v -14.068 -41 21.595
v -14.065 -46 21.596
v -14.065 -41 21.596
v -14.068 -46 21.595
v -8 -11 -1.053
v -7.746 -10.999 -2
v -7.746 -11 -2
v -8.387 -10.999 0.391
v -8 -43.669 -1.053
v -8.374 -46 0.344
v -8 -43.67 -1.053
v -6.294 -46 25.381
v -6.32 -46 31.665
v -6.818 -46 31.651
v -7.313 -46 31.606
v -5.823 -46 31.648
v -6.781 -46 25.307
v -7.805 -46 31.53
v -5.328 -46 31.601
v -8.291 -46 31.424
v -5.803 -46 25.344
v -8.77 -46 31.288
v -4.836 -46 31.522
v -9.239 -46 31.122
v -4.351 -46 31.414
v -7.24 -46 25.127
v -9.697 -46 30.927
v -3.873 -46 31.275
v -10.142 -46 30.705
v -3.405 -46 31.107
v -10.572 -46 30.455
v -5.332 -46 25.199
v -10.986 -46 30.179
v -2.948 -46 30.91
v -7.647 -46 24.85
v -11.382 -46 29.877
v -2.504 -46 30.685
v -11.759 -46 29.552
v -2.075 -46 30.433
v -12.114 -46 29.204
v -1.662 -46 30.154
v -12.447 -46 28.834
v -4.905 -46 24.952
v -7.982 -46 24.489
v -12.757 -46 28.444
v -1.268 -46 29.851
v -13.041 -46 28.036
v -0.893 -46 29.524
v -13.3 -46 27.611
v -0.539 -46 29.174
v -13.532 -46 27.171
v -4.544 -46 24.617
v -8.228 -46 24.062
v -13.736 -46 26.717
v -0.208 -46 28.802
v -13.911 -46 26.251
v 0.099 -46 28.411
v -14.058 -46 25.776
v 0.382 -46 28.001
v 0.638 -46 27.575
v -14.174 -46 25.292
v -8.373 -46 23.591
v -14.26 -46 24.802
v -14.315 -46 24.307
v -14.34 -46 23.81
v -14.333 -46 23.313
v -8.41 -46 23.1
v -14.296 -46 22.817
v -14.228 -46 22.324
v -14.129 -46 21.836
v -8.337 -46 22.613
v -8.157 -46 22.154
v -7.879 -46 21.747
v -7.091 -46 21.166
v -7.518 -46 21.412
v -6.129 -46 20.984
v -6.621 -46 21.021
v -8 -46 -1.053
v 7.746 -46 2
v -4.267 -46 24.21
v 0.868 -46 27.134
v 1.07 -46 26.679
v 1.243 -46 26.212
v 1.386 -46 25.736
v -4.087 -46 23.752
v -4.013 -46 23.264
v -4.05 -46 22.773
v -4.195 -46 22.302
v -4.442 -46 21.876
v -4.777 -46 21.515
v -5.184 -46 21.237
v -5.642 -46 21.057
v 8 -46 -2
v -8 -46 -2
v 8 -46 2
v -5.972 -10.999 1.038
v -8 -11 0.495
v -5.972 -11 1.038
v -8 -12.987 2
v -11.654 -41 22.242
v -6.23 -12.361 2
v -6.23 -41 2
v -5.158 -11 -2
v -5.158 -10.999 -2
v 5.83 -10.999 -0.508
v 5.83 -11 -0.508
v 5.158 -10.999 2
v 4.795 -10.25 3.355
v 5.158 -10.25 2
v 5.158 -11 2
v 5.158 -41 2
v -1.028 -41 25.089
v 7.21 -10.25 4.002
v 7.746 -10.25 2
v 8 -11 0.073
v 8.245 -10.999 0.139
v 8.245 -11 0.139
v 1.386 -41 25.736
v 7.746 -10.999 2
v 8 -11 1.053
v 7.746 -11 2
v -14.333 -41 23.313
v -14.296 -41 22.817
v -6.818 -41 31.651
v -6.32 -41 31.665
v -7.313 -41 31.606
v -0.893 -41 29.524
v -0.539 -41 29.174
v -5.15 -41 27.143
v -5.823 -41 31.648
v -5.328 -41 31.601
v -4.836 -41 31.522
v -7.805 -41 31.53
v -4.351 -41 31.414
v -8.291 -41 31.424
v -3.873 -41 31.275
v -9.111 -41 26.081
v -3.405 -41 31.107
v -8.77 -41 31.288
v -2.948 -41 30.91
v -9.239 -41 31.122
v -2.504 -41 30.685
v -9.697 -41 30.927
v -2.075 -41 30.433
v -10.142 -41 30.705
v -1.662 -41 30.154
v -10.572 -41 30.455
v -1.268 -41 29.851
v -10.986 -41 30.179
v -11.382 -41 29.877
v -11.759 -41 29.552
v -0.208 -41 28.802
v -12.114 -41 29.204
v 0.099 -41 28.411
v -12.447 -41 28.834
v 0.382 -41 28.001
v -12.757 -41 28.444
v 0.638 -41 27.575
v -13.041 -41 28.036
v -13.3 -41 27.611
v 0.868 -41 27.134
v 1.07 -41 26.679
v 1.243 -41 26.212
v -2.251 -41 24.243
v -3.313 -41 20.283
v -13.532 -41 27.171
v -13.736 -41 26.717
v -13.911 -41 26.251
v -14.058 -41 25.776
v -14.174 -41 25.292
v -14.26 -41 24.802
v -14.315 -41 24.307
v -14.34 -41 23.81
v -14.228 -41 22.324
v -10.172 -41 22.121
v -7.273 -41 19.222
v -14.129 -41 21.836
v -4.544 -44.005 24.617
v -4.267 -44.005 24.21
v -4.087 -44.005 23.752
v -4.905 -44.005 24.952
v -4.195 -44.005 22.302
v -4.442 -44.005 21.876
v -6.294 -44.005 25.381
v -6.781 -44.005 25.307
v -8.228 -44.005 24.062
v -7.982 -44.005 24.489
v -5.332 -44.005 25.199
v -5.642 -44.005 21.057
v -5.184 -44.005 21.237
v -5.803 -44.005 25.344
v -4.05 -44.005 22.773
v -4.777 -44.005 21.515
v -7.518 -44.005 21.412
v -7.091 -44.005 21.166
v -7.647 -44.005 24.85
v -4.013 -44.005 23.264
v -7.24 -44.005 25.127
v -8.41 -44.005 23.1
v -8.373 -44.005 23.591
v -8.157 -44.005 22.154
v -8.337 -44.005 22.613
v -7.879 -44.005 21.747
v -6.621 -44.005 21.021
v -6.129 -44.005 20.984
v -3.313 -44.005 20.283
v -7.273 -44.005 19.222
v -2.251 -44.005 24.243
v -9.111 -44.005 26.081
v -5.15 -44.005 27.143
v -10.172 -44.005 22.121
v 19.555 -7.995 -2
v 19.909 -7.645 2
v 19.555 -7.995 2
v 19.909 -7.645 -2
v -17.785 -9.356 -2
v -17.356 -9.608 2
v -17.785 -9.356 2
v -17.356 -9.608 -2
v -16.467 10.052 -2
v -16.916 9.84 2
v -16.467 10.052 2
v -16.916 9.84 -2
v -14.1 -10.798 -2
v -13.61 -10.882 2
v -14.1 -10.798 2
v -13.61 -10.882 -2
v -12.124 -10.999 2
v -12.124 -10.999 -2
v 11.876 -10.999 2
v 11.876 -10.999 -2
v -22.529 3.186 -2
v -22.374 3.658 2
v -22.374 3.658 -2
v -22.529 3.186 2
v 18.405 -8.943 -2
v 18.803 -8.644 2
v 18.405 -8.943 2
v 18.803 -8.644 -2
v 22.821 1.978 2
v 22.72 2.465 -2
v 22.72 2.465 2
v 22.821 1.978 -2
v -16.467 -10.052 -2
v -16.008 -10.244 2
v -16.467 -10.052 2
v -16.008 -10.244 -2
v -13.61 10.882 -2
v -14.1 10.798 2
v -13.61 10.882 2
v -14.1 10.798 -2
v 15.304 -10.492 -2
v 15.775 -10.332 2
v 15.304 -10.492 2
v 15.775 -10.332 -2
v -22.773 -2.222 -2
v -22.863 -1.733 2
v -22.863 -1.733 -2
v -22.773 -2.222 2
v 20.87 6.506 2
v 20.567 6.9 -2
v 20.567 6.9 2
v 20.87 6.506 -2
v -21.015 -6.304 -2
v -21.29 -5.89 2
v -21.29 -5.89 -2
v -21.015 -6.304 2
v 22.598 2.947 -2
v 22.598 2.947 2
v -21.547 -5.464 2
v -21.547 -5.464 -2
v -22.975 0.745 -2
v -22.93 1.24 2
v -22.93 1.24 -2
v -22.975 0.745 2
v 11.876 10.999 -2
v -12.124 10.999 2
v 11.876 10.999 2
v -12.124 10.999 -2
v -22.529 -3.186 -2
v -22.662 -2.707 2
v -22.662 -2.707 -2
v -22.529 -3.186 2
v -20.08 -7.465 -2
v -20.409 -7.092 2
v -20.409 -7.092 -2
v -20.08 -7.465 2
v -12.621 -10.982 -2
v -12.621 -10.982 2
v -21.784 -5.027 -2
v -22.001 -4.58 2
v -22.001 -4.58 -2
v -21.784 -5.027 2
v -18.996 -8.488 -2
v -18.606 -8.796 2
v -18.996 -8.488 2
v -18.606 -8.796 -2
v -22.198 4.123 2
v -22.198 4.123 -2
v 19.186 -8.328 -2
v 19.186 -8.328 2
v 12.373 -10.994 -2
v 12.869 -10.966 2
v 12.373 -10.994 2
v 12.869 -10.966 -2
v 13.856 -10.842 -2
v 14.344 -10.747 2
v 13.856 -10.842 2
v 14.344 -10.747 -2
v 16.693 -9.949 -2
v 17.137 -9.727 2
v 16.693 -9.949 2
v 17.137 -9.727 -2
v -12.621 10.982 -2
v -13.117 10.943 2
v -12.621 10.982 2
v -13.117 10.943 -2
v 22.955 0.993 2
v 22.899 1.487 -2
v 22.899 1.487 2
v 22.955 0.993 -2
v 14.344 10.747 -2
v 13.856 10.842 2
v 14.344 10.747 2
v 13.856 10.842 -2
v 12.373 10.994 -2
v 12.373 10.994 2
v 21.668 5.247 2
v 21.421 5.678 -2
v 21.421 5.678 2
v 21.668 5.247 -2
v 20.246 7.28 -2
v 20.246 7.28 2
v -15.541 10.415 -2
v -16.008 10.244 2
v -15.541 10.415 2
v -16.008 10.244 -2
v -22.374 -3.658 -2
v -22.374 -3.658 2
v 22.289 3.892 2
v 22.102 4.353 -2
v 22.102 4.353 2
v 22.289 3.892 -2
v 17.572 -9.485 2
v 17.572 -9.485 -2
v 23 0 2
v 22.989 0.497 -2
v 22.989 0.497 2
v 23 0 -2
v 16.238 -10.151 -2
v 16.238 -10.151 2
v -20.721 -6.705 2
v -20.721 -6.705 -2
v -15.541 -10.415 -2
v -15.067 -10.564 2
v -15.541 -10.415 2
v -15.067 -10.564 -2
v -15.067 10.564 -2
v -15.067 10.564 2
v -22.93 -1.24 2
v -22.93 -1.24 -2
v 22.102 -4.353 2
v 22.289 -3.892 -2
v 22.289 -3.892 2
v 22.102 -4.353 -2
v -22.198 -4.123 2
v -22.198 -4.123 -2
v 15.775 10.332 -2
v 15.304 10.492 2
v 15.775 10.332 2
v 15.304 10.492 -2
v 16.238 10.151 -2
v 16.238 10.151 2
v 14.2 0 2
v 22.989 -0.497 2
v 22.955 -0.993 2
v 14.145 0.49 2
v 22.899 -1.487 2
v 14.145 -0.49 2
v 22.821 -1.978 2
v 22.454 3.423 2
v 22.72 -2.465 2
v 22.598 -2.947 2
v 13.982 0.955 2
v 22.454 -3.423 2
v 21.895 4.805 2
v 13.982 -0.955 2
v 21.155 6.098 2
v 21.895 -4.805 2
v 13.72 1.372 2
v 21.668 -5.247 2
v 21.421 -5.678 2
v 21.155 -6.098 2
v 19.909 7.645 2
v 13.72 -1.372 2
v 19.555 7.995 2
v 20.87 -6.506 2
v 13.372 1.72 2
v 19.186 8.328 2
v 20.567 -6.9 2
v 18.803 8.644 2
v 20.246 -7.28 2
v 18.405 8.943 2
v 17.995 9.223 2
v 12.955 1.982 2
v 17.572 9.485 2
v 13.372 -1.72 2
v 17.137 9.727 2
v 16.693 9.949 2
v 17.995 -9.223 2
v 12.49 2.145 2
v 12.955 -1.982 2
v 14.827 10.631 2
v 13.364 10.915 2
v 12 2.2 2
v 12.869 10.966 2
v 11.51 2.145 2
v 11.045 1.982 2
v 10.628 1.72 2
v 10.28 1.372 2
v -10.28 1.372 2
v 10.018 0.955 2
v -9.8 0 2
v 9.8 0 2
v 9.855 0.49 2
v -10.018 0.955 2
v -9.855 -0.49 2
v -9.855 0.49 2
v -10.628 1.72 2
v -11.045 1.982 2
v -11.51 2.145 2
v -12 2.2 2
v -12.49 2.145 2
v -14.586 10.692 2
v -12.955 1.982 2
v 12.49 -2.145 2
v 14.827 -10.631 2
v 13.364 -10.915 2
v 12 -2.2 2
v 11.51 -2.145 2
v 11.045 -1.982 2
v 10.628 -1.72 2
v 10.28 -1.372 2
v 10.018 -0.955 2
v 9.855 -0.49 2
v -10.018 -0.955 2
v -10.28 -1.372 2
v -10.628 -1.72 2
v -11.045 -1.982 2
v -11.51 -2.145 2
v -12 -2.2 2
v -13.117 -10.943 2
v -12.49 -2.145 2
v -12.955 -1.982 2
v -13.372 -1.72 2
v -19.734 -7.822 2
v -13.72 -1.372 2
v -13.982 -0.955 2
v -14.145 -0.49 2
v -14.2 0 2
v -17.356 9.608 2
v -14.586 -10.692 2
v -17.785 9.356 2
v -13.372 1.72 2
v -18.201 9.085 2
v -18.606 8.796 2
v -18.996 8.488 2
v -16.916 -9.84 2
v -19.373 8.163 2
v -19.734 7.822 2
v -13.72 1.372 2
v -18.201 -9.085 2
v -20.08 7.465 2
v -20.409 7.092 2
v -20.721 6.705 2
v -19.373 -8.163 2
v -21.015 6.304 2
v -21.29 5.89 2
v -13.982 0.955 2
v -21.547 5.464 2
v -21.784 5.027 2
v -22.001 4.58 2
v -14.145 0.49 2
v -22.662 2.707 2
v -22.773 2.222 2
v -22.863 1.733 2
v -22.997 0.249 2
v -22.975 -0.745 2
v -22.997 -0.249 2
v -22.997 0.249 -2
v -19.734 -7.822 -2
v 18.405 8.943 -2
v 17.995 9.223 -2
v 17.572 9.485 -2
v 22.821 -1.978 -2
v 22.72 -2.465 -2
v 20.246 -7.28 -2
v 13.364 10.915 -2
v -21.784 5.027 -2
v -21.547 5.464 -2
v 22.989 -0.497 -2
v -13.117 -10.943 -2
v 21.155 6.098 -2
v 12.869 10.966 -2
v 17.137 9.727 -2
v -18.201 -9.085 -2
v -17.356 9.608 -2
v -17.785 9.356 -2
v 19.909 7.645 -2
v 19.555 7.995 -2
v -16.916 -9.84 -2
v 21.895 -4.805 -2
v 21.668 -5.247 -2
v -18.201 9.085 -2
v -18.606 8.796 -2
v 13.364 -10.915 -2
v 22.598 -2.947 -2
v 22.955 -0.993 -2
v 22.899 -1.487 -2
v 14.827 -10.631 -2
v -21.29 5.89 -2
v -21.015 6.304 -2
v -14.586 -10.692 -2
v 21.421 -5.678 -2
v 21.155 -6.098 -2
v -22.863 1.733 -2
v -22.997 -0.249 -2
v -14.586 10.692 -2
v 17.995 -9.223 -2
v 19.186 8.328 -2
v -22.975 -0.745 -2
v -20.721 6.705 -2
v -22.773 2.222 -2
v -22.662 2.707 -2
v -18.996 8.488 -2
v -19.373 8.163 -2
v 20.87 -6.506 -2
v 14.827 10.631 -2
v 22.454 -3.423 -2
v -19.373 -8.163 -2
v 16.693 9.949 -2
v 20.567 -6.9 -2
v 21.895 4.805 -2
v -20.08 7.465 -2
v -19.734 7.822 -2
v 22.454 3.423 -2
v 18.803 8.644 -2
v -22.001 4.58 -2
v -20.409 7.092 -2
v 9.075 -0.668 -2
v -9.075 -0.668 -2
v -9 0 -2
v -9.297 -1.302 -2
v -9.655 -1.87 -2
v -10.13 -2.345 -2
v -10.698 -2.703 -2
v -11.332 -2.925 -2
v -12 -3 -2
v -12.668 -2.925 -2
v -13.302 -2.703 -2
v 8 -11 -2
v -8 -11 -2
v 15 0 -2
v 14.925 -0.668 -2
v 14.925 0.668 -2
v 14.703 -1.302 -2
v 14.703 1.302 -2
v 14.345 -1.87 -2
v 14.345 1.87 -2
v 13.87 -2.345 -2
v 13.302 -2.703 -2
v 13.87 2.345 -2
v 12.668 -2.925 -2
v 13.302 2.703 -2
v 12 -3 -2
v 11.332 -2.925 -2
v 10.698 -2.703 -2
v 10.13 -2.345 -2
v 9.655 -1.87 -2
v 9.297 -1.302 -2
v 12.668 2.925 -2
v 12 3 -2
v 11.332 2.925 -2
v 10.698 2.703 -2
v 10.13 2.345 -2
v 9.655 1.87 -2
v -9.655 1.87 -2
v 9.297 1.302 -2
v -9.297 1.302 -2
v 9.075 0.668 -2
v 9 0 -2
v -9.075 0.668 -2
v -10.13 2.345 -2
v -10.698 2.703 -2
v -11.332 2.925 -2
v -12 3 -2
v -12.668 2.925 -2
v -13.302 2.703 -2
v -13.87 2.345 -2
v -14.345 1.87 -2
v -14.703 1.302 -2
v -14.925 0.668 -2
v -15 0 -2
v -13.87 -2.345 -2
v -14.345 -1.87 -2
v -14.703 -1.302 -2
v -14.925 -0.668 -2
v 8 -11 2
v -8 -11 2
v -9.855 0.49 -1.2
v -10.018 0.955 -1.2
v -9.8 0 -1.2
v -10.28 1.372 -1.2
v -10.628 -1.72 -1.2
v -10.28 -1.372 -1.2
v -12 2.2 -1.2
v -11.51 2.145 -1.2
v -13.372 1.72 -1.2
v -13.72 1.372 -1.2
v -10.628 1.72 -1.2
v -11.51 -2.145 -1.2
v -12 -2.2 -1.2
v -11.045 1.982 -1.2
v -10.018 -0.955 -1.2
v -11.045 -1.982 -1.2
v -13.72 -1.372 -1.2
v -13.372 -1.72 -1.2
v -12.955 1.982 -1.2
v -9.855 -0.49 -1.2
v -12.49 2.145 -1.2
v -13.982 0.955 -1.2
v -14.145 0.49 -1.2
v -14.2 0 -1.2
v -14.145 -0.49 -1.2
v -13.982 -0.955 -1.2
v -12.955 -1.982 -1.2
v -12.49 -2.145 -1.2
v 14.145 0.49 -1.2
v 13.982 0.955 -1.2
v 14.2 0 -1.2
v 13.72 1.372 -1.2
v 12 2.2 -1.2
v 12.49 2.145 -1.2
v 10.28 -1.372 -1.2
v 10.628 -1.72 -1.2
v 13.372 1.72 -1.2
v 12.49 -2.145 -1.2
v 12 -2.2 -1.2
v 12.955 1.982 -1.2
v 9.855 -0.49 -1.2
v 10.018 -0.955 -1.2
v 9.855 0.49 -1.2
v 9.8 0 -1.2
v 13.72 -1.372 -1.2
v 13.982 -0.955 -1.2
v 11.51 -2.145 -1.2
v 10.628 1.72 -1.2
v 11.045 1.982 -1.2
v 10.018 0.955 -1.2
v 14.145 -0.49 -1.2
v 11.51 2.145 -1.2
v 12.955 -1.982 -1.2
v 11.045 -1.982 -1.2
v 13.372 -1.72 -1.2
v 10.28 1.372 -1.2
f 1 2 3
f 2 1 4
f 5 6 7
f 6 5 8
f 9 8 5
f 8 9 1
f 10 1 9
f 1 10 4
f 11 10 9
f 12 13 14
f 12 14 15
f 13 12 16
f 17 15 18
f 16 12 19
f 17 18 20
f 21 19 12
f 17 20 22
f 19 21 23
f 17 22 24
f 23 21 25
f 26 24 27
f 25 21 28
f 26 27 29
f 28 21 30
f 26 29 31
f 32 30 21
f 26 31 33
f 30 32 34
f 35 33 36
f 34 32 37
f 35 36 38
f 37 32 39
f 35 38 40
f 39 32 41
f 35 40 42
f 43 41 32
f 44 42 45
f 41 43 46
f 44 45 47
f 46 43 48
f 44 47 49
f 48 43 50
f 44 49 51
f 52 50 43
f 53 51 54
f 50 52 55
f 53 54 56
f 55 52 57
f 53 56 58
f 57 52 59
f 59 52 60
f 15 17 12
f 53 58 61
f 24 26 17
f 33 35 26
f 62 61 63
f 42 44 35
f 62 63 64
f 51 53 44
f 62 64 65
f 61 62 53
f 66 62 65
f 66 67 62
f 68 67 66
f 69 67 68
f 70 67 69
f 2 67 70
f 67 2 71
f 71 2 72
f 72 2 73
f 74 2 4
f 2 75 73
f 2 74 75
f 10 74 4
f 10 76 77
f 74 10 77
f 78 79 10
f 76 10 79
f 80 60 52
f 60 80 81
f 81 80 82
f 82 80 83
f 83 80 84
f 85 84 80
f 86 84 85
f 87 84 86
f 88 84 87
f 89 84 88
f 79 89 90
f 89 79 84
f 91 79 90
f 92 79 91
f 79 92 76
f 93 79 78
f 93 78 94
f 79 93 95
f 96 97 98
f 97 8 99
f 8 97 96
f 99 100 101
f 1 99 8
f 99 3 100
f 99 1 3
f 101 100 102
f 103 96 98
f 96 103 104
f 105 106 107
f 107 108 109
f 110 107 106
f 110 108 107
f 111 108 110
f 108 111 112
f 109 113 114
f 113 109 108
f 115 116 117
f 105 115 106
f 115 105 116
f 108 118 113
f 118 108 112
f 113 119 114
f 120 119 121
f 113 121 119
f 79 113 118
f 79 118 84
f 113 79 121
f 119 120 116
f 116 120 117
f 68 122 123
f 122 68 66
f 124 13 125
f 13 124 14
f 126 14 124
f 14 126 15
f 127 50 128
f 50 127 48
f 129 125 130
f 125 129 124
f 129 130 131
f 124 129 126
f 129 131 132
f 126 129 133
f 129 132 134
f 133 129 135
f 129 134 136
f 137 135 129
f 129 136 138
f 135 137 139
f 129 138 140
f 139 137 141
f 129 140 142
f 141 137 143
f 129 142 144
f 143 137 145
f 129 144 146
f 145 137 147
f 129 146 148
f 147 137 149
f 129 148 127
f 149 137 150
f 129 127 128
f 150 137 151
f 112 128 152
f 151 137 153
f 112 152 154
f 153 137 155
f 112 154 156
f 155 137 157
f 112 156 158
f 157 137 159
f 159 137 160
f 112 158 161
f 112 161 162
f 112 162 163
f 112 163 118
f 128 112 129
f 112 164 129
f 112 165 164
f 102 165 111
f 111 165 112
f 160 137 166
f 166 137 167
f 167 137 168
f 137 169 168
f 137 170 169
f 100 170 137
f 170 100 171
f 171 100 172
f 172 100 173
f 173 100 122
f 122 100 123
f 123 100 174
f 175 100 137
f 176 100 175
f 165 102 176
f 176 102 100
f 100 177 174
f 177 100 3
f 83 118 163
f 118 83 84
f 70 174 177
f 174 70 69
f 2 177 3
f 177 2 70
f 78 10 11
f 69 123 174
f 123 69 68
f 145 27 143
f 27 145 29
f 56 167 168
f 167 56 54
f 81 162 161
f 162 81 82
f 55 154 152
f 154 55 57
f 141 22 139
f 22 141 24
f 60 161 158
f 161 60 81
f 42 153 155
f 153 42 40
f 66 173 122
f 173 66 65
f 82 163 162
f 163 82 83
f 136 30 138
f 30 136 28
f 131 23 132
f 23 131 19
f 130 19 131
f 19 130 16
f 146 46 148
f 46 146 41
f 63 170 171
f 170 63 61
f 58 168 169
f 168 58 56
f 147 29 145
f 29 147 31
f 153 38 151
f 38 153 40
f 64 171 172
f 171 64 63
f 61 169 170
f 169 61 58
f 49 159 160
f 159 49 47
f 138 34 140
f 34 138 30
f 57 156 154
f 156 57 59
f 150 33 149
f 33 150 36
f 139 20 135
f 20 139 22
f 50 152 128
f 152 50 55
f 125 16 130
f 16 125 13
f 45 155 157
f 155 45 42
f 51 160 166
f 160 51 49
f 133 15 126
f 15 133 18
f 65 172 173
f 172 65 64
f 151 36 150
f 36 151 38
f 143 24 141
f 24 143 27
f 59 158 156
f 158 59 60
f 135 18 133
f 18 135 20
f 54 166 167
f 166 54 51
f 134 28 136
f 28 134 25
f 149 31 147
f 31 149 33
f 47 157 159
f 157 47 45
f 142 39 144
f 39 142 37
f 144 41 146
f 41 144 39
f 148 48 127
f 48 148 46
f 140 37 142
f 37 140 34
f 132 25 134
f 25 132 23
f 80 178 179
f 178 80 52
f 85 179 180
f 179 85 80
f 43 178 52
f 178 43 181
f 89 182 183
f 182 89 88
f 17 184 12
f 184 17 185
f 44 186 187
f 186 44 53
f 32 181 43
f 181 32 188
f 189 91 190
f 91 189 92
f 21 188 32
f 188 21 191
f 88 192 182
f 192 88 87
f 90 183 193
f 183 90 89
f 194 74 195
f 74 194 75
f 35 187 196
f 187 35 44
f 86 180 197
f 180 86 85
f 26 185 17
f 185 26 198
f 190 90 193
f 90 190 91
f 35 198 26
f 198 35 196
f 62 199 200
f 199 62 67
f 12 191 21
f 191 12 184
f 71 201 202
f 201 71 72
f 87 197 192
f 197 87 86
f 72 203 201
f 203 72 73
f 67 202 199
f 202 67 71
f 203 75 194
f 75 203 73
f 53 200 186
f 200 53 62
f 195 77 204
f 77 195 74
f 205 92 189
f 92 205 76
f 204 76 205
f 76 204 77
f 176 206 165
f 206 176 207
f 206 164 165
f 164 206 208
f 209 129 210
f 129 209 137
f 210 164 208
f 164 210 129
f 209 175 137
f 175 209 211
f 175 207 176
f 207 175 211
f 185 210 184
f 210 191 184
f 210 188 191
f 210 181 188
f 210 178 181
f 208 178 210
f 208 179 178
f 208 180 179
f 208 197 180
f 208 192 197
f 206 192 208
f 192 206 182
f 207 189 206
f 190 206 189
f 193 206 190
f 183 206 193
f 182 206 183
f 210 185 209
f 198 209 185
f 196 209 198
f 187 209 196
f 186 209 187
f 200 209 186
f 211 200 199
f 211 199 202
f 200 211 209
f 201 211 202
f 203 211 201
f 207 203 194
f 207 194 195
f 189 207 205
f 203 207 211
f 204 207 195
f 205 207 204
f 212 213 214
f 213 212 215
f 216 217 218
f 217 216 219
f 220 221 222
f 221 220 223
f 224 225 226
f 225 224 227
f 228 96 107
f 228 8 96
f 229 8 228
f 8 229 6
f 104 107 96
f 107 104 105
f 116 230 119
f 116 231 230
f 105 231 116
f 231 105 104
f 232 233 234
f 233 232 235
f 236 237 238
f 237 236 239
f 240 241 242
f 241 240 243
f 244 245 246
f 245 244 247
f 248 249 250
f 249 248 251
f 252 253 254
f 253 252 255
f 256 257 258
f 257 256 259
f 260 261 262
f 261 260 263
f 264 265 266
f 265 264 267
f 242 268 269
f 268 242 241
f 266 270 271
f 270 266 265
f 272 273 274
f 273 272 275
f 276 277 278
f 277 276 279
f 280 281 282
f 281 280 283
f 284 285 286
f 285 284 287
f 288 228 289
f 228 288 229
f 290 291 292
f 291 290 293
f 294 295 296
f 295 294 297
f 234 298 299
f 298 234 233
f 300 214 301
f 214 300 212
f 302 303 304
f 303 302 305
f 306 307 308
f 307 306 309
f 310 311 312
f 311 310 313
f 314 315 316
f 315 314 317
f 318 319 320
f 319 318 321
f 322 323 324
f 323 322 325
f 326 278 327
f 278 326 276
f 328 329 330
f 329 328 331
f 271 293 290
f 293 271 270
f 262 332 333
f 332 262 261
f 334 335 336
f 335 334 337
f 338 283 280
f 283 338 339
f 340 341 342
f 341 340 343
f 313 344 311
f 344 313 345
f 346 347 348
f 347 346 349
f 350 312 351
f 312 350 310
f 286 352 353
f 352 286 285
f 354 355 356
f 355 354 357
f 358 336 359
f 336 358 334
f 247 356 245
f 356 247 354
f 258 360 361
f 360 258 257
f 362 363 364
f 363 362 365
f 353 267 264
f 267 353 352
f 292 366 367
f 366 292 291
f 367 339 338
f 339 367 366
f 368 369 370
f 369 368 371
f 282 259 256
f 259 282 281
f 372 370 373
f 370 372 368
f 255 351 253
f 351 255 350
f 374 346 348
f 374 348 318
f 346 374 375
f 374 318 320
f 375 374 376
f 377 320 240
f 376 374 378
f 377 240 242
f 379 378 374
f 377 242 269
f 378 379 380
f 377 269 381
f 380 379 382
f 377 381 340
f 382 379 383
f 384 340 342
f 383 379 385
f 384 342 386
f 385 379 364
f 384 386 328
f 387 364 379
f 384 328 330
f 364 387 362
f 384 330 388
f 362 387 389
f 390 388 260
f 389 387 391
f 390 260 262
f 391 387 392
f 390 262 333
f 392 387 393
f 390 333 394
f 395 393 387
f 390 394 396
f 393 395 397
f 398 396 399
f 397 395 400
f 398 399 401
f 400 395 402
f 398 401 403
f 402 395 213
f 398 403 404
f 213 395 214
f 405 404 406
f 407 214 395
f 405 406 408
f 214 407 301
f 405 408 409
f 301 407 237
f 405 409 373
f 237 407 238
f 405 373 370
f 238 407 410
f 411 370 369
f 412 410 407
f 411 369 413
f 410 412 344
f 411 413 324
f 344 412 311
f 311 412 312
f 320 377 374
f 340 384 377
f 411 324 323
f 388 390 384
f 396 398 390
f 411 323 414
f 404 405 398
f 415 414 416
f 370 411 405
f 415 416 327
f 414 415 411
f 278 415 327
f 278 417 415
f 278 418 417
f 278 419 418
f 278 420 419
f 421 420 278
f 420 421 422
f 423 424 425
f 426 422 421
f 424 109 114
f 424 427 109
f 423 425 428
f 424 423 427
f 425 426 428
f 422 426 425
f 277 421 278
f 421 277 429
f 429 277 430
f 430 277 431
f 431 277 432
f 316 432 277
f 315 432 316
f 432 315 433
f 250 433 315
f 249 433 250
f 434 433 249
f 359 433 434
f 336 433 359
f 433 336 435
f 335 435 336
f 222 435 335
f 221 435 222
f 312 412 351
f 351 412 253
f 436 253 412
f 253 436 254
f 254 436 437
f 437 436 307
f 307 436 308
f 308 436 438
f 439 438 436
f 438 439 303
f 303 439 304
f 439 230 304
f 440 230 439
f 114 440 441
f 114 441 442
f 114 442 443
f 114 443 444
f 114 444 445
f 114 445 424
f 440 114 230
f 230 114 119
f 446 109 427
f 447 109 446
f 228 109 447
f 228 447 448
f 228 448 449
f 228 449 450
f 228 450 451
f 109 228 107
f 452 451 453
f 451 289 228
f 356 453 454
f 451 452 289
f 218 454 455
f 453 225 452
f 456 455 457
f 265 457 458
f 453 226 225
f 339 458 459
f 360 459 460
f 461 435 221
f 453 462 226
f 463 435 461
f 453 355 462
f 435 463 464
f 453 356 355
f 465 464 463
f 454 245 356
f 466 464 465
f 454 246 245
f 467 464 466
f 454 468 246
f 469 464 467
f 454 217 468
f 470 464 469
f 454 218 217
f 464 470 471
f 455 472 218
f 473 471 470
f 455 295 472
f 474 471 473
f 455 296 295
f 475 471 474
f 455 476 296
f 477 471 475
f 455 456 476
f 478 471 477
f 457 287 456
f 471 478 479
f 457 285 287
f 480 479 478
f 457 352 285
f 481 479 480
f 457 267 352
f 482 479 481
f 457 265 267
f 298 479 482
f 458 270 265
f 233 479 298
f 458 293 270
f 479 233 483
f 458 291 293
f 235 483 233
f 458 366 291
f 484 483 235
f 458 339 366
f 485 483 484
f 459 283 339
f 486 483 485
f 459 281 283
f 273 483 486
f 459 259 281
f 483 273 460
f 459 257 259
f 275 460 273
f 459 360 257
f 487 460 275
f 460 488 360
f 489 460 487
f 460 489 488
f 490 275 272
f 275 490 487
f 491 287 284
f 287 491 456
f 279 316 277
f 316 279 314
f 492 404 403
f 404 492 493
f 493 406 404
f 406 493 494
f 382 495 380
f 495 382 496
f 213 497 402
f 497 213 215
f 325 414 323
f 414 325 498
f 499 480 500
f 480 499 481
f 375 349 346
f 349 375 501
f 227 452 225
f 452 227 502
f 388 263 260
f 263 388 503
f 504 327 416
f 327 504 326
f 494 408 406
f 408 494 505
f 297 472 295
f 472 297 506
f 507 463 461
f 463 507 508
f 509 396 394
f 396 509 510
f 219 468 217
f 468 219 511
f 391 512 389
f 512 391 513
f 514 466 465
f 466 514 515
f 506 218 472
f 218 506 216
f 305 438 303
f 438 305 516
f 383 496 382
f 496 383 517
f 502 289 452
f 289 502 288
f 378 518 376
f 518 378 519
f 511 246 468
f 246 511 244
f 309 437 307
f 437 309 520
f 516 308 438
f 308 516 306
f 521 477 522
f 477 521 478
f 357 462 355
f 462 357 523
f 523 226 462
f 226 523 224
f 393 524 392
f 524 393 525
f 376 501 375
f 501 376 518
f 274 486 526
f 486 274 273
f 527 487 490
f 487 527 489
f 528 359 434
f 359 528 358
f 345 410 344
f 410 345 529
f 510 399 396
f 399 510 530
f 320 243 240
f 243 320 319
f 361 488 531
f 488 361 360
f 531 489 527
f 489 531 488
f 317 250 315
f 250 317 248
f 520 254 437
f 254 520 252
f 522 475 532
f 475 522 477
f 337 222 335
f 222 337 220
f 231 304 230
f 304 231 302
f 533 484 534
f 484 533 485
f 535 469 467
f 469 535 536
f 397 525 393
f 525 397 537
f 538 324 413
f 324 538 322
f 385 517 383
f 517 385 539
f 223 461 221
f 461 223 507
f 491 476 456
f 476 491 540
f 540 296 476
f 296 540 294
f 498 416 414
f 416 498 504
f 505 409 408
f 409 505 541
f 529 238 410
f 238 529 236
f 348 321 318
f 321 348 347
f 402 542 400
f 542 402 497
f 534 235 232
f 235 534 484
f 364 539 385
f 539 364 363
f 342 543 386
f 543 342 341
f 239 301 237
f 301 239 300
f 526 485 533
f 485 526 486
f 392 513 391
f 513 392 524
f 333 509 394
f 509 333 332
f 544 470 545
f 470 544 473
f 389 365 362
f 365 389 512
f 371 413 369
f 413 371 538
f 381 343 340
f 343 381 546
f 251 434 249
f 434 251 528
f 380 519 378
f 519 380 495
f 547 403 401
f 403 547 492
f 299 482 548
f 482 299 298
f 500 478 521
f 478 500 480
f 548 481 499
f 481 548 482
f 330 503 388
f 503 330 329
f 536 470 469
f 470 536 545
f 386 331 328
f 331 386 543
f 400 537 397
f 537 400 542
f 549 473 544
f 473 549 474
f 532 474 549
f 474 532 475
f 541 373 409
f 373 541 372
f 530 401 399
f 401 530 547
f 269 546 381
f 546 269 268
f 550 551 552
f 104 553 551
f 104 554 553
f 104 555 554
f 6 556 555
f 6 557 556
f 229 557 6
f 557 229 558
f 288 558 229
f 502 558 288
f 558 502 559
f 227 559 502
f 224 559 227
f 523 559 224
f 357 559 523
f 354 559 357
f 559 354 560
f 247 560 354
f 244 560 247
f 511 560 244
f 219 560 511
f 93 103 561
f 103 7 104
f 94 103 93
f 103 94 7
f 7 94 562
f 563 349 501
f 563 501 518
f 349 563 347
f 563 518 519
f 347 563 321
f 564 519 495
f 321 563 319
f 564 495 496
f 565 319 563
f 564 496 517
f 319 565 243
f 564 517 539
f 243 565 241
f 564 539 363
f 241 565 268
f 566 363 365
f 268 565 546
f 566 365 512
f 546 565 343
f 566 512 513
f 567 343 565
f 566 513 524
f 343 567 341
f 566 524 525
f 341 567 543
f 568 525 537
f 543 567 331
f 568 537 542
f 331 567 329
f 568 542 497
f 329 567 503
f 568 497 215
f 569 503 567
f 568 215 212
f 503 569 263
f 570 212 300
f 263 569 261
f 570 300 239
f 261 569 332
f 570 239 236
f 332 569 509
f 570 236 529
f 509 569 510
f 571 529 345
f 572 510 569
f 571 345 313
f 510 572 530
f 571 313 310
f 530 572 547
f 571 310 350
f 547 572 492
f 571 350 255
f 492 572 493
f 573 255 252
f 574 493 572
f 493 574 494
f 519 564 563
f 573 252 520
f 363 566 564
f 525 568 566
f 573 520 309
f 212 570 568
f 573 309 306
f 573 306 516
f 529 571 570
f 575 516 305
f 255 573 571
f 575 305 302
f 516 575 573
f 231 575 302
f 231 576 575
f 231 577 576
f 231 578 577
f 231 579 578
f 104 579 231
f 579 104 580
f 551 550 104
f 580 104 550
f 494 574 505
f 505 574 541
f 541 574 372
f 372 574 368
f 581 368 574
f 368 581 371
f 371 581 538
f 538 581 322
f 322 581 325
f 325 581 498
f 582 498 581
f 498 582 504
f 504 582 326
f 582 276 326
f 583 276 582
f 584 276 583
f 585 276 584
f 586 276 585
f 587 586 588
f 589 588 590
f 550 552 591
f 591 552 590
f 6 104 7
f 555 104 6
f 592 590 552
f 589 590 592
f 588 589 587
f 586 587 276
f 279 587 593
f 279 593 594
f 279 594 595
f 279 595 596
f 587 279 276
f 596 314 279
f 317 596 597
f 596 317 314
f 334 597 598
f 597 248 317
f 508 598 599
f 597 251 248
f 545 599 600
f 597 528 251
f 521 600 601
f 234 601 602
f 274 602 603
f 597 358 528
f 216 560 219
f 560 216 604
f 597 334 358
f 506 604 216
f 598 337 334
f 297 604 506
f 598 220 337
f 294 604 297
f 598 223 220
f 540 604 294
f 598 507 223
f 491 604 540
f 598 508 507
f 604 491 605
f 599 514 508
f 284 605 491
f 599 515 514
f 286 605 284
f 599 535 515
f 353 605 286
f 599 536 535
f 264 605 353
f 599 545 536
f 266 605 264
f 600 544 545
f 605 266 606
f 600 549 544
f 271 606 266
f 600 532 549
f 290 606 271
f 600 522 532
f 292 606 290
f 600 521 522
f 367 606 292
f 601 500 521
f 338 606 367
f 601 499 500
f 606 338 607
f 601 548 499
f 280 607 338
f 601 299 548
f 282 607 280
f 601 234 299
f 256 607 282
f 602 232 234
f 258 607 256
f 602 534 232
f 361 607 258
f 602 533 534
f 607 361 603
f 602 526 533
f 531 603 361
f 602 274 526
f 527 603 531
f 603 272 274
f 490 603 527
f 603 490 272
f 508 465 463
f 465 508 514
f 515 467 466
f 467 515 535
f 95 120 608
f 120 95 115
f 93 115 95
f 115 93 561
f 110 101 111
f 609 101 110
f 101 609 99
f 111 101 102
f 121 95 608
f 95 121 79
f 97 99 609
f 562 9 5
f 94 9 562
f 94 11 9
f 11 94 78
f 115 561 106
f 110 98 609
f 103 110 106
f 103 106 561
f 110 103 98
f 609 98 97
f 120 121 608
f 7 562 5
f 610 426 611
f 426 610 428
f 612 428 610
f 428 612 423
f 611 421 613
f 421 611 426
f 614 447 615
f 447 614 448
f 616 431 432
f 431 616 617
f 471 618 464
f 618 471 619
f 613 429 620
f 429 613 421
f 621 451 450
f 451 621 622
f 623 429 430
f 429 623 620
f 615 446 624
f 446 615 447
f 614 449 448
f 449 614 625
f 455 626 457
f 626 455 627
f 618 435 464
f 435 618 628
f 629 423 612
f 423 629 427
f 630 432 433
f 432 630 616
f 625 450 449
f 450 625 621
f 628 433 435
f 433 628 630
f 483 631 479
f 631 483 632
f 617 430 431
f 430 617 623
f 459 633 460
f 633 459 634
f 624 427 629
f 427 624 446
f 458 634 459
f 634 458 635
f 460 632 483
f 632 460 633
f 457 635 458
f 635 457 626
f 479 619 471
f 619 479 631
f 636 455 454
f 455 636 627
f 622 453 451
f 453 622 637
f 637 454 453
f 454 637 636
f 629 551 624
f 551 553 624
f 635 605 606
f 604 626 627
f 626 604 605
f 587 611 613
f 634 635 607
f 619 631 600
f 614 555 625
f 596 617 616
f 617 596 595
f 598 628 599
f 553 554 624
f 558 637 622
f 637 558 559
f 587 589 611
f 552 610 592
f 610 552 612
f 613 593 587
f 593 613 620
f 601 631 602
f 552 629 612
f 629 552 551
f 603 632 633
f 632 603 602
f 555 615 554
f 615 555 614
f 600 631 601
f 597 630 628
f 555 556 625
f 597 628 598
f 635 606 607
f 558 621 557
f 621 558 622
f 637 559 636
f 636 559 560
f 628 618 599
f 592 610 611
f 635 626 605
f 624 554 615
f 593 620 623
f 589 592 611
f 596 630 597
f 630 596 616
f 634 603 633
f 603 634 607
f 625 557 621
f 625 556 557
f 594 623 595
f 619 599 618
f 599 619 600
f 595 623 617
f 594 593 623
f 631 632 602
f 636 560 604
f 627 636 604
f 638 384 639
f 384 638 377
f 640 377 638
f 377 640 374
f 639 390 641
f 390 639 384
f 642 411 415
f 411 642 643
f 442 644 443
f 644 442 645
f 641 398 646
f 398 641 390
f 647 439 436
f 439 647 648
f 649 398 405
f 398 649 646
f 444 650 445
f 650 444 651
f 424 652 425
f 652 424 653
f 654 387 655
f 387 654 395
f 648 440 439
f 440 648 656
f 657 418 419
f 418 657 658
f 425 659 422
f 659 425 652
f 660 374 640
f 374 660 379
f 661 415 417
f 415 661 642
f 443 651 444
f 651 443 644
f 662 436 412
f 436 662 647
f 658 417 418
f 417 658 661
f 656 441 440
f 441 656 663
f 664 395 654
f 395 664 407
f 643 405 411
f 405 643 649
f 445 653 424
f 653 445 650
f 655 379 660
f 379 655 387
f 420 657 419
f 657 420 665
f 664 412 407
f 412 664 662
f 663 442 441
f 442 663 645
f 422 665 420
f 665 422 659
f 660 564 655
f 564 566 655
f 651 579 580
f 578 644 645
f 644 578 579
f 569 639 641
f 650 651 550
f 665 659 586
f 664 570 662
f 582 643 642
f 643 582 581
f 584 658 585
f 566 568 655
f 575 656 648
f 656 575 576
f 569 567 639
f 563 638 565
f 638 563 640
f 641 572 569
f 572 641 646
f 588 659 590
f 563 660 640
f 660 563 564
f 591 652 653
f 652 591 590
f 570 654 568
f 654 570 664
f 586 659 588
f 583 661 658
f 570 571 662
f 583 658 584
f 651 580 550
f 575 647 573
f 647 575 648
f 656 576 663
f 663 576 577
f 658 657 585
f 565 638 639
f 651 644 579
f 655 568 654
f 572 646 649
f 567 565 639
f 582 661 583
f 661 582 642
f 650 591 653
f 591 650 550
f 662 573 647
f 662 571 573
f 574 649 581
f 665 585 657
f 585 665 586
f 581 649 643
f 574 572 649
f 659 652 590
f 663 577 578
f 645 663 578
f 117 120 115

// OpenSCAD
include <cloverplus_v3_utils.scad>;
$fs = 0.5;
$fa = 0.5;
//---------------------------------------------------------------------------------------------------- 
// CloverPlus v3 extruder mount by pbmax (mpeterson333/@/gmail.com)
//---------------------------------------------------------------------------------------------------- 
// This is a bracket that mounts a Compact Extruder to the cloverplus bottom base part.
//
// Note that this part uses variables from cloverplus_v3_utils.scad
//---------------------------------------------------------------------------------------------------- 
cloverplus_v3_extruder_mount();

module cloverplus_v3_extruder_mount(mockup = false)
{

  extruder_mount();

  
  module extruder_mount(mockup = false)
  {
    difference()
    {
      union()
      {
        // Base mount
        hull()
          for(i = [-1,1])
            translate([i*bottom_leg_extruder_mount_holes_spacing*0.5, 0, 0])
              cylinder(h=extruder_mount_base_t, d=base_width, center=true);
  
        // overhang
        translate([0, -base_width*0.5-extruder_mount_overhang*0.5, 0])
          cube([extruder_mount_w, extruder_mount_overhang, extruder_mount_base_t], center=true);
  
        // Upright part the extruder mounts to
        rotate([0, -extruder_mount_angle, 0])
        difference()
        {

          union()
          {
            // Supports
            for(i = [-1,1])
              translate([i*(extruder_mount_w*0.5-extruder_mount_t*0.25), -extruder_mount_overhang, 0])
                hull()
                {
                  translate([0,extruder_mount_overhang-base_width-extruder_mount_t*0.5,0])
                    cube([extruder_mount_t*0.5, base_width*0.5+extruder_mount_overhang*0.5, extruder_mount_base_t], center=true);
                  translate([0, -base_width*0.5 + extruder_mount_t*0.5, base_width*0.5+extruder_mount_t*0.5])
                    cube([extruder_mount_t*0.5, extruder_mount_t, base_width], center=true);
                }
            // Upright
            translate([0, -extruder_mount_overhang, 0])
              hull()
              {
                translate([0, -base_width*0.5 + extruder_mount_t*0.5, 0])
                  cube([extruder_mount_w, extruder_mount_t, 1], center=true);
                translate([0, -base_width*0.5+extruder_mount_t*0.5, extruder_mount_t*0.5+extruder_mount_h-extruder_mount_w*0.5])
                  rotate([90,0,0])
                    cylinder(h=extruder_mount_t, d=extruder_mount_w, center=true);
            }
          }
          // Nuttraps for extruder attach
          translate([0, -extruder_mount_overhang, 0])
            for(i = [-1,1])
              translate([0, 
                         -base_width*0.5+extruder_mount_t, 
                         extruder_mount_base_t*0.5+extruder_mount_h-extruder_mount_w*0.5-extruder_mount_screw_spacing*0.5
                           +i*extruder_mount_screw_spacing*0.5])
                rotate([90,0,0])
                  nuttrap(m4_hole_d, extruder_mount_t*0.5, m4_nuttrap_d, extruder_m4_nuttrap_depth, smash_comp=false);
        }
      }
  
      // Chop off the bottom and side extras from the rotate
      translate([0, 0, -extruder_mount_base_t])
        cube([100,100,extruder_mount_base_t], center=true);
      translate([extruder_mount_w, -base_width*0.5-extruder_mount_overhang*0.5, 0])
        cube([extruder_mount_w, extruder_mount_overhang, extruder_mount_base_t], center=true);
      // Screw holes for base attach
      for(i = [-1,1])
        translate([i*bottom_leg_extruder_mount_holes_spacing*0.5, 0, 0])
        {
          cylinder(h=extruder_mount_t*2, d=m4_hole_d, center=true);
          translate([0, 0, -extruder_mount_base_t*0.5])
            hole_smash_comp(m4_hole_d);
        }
  

    }
  }
}
